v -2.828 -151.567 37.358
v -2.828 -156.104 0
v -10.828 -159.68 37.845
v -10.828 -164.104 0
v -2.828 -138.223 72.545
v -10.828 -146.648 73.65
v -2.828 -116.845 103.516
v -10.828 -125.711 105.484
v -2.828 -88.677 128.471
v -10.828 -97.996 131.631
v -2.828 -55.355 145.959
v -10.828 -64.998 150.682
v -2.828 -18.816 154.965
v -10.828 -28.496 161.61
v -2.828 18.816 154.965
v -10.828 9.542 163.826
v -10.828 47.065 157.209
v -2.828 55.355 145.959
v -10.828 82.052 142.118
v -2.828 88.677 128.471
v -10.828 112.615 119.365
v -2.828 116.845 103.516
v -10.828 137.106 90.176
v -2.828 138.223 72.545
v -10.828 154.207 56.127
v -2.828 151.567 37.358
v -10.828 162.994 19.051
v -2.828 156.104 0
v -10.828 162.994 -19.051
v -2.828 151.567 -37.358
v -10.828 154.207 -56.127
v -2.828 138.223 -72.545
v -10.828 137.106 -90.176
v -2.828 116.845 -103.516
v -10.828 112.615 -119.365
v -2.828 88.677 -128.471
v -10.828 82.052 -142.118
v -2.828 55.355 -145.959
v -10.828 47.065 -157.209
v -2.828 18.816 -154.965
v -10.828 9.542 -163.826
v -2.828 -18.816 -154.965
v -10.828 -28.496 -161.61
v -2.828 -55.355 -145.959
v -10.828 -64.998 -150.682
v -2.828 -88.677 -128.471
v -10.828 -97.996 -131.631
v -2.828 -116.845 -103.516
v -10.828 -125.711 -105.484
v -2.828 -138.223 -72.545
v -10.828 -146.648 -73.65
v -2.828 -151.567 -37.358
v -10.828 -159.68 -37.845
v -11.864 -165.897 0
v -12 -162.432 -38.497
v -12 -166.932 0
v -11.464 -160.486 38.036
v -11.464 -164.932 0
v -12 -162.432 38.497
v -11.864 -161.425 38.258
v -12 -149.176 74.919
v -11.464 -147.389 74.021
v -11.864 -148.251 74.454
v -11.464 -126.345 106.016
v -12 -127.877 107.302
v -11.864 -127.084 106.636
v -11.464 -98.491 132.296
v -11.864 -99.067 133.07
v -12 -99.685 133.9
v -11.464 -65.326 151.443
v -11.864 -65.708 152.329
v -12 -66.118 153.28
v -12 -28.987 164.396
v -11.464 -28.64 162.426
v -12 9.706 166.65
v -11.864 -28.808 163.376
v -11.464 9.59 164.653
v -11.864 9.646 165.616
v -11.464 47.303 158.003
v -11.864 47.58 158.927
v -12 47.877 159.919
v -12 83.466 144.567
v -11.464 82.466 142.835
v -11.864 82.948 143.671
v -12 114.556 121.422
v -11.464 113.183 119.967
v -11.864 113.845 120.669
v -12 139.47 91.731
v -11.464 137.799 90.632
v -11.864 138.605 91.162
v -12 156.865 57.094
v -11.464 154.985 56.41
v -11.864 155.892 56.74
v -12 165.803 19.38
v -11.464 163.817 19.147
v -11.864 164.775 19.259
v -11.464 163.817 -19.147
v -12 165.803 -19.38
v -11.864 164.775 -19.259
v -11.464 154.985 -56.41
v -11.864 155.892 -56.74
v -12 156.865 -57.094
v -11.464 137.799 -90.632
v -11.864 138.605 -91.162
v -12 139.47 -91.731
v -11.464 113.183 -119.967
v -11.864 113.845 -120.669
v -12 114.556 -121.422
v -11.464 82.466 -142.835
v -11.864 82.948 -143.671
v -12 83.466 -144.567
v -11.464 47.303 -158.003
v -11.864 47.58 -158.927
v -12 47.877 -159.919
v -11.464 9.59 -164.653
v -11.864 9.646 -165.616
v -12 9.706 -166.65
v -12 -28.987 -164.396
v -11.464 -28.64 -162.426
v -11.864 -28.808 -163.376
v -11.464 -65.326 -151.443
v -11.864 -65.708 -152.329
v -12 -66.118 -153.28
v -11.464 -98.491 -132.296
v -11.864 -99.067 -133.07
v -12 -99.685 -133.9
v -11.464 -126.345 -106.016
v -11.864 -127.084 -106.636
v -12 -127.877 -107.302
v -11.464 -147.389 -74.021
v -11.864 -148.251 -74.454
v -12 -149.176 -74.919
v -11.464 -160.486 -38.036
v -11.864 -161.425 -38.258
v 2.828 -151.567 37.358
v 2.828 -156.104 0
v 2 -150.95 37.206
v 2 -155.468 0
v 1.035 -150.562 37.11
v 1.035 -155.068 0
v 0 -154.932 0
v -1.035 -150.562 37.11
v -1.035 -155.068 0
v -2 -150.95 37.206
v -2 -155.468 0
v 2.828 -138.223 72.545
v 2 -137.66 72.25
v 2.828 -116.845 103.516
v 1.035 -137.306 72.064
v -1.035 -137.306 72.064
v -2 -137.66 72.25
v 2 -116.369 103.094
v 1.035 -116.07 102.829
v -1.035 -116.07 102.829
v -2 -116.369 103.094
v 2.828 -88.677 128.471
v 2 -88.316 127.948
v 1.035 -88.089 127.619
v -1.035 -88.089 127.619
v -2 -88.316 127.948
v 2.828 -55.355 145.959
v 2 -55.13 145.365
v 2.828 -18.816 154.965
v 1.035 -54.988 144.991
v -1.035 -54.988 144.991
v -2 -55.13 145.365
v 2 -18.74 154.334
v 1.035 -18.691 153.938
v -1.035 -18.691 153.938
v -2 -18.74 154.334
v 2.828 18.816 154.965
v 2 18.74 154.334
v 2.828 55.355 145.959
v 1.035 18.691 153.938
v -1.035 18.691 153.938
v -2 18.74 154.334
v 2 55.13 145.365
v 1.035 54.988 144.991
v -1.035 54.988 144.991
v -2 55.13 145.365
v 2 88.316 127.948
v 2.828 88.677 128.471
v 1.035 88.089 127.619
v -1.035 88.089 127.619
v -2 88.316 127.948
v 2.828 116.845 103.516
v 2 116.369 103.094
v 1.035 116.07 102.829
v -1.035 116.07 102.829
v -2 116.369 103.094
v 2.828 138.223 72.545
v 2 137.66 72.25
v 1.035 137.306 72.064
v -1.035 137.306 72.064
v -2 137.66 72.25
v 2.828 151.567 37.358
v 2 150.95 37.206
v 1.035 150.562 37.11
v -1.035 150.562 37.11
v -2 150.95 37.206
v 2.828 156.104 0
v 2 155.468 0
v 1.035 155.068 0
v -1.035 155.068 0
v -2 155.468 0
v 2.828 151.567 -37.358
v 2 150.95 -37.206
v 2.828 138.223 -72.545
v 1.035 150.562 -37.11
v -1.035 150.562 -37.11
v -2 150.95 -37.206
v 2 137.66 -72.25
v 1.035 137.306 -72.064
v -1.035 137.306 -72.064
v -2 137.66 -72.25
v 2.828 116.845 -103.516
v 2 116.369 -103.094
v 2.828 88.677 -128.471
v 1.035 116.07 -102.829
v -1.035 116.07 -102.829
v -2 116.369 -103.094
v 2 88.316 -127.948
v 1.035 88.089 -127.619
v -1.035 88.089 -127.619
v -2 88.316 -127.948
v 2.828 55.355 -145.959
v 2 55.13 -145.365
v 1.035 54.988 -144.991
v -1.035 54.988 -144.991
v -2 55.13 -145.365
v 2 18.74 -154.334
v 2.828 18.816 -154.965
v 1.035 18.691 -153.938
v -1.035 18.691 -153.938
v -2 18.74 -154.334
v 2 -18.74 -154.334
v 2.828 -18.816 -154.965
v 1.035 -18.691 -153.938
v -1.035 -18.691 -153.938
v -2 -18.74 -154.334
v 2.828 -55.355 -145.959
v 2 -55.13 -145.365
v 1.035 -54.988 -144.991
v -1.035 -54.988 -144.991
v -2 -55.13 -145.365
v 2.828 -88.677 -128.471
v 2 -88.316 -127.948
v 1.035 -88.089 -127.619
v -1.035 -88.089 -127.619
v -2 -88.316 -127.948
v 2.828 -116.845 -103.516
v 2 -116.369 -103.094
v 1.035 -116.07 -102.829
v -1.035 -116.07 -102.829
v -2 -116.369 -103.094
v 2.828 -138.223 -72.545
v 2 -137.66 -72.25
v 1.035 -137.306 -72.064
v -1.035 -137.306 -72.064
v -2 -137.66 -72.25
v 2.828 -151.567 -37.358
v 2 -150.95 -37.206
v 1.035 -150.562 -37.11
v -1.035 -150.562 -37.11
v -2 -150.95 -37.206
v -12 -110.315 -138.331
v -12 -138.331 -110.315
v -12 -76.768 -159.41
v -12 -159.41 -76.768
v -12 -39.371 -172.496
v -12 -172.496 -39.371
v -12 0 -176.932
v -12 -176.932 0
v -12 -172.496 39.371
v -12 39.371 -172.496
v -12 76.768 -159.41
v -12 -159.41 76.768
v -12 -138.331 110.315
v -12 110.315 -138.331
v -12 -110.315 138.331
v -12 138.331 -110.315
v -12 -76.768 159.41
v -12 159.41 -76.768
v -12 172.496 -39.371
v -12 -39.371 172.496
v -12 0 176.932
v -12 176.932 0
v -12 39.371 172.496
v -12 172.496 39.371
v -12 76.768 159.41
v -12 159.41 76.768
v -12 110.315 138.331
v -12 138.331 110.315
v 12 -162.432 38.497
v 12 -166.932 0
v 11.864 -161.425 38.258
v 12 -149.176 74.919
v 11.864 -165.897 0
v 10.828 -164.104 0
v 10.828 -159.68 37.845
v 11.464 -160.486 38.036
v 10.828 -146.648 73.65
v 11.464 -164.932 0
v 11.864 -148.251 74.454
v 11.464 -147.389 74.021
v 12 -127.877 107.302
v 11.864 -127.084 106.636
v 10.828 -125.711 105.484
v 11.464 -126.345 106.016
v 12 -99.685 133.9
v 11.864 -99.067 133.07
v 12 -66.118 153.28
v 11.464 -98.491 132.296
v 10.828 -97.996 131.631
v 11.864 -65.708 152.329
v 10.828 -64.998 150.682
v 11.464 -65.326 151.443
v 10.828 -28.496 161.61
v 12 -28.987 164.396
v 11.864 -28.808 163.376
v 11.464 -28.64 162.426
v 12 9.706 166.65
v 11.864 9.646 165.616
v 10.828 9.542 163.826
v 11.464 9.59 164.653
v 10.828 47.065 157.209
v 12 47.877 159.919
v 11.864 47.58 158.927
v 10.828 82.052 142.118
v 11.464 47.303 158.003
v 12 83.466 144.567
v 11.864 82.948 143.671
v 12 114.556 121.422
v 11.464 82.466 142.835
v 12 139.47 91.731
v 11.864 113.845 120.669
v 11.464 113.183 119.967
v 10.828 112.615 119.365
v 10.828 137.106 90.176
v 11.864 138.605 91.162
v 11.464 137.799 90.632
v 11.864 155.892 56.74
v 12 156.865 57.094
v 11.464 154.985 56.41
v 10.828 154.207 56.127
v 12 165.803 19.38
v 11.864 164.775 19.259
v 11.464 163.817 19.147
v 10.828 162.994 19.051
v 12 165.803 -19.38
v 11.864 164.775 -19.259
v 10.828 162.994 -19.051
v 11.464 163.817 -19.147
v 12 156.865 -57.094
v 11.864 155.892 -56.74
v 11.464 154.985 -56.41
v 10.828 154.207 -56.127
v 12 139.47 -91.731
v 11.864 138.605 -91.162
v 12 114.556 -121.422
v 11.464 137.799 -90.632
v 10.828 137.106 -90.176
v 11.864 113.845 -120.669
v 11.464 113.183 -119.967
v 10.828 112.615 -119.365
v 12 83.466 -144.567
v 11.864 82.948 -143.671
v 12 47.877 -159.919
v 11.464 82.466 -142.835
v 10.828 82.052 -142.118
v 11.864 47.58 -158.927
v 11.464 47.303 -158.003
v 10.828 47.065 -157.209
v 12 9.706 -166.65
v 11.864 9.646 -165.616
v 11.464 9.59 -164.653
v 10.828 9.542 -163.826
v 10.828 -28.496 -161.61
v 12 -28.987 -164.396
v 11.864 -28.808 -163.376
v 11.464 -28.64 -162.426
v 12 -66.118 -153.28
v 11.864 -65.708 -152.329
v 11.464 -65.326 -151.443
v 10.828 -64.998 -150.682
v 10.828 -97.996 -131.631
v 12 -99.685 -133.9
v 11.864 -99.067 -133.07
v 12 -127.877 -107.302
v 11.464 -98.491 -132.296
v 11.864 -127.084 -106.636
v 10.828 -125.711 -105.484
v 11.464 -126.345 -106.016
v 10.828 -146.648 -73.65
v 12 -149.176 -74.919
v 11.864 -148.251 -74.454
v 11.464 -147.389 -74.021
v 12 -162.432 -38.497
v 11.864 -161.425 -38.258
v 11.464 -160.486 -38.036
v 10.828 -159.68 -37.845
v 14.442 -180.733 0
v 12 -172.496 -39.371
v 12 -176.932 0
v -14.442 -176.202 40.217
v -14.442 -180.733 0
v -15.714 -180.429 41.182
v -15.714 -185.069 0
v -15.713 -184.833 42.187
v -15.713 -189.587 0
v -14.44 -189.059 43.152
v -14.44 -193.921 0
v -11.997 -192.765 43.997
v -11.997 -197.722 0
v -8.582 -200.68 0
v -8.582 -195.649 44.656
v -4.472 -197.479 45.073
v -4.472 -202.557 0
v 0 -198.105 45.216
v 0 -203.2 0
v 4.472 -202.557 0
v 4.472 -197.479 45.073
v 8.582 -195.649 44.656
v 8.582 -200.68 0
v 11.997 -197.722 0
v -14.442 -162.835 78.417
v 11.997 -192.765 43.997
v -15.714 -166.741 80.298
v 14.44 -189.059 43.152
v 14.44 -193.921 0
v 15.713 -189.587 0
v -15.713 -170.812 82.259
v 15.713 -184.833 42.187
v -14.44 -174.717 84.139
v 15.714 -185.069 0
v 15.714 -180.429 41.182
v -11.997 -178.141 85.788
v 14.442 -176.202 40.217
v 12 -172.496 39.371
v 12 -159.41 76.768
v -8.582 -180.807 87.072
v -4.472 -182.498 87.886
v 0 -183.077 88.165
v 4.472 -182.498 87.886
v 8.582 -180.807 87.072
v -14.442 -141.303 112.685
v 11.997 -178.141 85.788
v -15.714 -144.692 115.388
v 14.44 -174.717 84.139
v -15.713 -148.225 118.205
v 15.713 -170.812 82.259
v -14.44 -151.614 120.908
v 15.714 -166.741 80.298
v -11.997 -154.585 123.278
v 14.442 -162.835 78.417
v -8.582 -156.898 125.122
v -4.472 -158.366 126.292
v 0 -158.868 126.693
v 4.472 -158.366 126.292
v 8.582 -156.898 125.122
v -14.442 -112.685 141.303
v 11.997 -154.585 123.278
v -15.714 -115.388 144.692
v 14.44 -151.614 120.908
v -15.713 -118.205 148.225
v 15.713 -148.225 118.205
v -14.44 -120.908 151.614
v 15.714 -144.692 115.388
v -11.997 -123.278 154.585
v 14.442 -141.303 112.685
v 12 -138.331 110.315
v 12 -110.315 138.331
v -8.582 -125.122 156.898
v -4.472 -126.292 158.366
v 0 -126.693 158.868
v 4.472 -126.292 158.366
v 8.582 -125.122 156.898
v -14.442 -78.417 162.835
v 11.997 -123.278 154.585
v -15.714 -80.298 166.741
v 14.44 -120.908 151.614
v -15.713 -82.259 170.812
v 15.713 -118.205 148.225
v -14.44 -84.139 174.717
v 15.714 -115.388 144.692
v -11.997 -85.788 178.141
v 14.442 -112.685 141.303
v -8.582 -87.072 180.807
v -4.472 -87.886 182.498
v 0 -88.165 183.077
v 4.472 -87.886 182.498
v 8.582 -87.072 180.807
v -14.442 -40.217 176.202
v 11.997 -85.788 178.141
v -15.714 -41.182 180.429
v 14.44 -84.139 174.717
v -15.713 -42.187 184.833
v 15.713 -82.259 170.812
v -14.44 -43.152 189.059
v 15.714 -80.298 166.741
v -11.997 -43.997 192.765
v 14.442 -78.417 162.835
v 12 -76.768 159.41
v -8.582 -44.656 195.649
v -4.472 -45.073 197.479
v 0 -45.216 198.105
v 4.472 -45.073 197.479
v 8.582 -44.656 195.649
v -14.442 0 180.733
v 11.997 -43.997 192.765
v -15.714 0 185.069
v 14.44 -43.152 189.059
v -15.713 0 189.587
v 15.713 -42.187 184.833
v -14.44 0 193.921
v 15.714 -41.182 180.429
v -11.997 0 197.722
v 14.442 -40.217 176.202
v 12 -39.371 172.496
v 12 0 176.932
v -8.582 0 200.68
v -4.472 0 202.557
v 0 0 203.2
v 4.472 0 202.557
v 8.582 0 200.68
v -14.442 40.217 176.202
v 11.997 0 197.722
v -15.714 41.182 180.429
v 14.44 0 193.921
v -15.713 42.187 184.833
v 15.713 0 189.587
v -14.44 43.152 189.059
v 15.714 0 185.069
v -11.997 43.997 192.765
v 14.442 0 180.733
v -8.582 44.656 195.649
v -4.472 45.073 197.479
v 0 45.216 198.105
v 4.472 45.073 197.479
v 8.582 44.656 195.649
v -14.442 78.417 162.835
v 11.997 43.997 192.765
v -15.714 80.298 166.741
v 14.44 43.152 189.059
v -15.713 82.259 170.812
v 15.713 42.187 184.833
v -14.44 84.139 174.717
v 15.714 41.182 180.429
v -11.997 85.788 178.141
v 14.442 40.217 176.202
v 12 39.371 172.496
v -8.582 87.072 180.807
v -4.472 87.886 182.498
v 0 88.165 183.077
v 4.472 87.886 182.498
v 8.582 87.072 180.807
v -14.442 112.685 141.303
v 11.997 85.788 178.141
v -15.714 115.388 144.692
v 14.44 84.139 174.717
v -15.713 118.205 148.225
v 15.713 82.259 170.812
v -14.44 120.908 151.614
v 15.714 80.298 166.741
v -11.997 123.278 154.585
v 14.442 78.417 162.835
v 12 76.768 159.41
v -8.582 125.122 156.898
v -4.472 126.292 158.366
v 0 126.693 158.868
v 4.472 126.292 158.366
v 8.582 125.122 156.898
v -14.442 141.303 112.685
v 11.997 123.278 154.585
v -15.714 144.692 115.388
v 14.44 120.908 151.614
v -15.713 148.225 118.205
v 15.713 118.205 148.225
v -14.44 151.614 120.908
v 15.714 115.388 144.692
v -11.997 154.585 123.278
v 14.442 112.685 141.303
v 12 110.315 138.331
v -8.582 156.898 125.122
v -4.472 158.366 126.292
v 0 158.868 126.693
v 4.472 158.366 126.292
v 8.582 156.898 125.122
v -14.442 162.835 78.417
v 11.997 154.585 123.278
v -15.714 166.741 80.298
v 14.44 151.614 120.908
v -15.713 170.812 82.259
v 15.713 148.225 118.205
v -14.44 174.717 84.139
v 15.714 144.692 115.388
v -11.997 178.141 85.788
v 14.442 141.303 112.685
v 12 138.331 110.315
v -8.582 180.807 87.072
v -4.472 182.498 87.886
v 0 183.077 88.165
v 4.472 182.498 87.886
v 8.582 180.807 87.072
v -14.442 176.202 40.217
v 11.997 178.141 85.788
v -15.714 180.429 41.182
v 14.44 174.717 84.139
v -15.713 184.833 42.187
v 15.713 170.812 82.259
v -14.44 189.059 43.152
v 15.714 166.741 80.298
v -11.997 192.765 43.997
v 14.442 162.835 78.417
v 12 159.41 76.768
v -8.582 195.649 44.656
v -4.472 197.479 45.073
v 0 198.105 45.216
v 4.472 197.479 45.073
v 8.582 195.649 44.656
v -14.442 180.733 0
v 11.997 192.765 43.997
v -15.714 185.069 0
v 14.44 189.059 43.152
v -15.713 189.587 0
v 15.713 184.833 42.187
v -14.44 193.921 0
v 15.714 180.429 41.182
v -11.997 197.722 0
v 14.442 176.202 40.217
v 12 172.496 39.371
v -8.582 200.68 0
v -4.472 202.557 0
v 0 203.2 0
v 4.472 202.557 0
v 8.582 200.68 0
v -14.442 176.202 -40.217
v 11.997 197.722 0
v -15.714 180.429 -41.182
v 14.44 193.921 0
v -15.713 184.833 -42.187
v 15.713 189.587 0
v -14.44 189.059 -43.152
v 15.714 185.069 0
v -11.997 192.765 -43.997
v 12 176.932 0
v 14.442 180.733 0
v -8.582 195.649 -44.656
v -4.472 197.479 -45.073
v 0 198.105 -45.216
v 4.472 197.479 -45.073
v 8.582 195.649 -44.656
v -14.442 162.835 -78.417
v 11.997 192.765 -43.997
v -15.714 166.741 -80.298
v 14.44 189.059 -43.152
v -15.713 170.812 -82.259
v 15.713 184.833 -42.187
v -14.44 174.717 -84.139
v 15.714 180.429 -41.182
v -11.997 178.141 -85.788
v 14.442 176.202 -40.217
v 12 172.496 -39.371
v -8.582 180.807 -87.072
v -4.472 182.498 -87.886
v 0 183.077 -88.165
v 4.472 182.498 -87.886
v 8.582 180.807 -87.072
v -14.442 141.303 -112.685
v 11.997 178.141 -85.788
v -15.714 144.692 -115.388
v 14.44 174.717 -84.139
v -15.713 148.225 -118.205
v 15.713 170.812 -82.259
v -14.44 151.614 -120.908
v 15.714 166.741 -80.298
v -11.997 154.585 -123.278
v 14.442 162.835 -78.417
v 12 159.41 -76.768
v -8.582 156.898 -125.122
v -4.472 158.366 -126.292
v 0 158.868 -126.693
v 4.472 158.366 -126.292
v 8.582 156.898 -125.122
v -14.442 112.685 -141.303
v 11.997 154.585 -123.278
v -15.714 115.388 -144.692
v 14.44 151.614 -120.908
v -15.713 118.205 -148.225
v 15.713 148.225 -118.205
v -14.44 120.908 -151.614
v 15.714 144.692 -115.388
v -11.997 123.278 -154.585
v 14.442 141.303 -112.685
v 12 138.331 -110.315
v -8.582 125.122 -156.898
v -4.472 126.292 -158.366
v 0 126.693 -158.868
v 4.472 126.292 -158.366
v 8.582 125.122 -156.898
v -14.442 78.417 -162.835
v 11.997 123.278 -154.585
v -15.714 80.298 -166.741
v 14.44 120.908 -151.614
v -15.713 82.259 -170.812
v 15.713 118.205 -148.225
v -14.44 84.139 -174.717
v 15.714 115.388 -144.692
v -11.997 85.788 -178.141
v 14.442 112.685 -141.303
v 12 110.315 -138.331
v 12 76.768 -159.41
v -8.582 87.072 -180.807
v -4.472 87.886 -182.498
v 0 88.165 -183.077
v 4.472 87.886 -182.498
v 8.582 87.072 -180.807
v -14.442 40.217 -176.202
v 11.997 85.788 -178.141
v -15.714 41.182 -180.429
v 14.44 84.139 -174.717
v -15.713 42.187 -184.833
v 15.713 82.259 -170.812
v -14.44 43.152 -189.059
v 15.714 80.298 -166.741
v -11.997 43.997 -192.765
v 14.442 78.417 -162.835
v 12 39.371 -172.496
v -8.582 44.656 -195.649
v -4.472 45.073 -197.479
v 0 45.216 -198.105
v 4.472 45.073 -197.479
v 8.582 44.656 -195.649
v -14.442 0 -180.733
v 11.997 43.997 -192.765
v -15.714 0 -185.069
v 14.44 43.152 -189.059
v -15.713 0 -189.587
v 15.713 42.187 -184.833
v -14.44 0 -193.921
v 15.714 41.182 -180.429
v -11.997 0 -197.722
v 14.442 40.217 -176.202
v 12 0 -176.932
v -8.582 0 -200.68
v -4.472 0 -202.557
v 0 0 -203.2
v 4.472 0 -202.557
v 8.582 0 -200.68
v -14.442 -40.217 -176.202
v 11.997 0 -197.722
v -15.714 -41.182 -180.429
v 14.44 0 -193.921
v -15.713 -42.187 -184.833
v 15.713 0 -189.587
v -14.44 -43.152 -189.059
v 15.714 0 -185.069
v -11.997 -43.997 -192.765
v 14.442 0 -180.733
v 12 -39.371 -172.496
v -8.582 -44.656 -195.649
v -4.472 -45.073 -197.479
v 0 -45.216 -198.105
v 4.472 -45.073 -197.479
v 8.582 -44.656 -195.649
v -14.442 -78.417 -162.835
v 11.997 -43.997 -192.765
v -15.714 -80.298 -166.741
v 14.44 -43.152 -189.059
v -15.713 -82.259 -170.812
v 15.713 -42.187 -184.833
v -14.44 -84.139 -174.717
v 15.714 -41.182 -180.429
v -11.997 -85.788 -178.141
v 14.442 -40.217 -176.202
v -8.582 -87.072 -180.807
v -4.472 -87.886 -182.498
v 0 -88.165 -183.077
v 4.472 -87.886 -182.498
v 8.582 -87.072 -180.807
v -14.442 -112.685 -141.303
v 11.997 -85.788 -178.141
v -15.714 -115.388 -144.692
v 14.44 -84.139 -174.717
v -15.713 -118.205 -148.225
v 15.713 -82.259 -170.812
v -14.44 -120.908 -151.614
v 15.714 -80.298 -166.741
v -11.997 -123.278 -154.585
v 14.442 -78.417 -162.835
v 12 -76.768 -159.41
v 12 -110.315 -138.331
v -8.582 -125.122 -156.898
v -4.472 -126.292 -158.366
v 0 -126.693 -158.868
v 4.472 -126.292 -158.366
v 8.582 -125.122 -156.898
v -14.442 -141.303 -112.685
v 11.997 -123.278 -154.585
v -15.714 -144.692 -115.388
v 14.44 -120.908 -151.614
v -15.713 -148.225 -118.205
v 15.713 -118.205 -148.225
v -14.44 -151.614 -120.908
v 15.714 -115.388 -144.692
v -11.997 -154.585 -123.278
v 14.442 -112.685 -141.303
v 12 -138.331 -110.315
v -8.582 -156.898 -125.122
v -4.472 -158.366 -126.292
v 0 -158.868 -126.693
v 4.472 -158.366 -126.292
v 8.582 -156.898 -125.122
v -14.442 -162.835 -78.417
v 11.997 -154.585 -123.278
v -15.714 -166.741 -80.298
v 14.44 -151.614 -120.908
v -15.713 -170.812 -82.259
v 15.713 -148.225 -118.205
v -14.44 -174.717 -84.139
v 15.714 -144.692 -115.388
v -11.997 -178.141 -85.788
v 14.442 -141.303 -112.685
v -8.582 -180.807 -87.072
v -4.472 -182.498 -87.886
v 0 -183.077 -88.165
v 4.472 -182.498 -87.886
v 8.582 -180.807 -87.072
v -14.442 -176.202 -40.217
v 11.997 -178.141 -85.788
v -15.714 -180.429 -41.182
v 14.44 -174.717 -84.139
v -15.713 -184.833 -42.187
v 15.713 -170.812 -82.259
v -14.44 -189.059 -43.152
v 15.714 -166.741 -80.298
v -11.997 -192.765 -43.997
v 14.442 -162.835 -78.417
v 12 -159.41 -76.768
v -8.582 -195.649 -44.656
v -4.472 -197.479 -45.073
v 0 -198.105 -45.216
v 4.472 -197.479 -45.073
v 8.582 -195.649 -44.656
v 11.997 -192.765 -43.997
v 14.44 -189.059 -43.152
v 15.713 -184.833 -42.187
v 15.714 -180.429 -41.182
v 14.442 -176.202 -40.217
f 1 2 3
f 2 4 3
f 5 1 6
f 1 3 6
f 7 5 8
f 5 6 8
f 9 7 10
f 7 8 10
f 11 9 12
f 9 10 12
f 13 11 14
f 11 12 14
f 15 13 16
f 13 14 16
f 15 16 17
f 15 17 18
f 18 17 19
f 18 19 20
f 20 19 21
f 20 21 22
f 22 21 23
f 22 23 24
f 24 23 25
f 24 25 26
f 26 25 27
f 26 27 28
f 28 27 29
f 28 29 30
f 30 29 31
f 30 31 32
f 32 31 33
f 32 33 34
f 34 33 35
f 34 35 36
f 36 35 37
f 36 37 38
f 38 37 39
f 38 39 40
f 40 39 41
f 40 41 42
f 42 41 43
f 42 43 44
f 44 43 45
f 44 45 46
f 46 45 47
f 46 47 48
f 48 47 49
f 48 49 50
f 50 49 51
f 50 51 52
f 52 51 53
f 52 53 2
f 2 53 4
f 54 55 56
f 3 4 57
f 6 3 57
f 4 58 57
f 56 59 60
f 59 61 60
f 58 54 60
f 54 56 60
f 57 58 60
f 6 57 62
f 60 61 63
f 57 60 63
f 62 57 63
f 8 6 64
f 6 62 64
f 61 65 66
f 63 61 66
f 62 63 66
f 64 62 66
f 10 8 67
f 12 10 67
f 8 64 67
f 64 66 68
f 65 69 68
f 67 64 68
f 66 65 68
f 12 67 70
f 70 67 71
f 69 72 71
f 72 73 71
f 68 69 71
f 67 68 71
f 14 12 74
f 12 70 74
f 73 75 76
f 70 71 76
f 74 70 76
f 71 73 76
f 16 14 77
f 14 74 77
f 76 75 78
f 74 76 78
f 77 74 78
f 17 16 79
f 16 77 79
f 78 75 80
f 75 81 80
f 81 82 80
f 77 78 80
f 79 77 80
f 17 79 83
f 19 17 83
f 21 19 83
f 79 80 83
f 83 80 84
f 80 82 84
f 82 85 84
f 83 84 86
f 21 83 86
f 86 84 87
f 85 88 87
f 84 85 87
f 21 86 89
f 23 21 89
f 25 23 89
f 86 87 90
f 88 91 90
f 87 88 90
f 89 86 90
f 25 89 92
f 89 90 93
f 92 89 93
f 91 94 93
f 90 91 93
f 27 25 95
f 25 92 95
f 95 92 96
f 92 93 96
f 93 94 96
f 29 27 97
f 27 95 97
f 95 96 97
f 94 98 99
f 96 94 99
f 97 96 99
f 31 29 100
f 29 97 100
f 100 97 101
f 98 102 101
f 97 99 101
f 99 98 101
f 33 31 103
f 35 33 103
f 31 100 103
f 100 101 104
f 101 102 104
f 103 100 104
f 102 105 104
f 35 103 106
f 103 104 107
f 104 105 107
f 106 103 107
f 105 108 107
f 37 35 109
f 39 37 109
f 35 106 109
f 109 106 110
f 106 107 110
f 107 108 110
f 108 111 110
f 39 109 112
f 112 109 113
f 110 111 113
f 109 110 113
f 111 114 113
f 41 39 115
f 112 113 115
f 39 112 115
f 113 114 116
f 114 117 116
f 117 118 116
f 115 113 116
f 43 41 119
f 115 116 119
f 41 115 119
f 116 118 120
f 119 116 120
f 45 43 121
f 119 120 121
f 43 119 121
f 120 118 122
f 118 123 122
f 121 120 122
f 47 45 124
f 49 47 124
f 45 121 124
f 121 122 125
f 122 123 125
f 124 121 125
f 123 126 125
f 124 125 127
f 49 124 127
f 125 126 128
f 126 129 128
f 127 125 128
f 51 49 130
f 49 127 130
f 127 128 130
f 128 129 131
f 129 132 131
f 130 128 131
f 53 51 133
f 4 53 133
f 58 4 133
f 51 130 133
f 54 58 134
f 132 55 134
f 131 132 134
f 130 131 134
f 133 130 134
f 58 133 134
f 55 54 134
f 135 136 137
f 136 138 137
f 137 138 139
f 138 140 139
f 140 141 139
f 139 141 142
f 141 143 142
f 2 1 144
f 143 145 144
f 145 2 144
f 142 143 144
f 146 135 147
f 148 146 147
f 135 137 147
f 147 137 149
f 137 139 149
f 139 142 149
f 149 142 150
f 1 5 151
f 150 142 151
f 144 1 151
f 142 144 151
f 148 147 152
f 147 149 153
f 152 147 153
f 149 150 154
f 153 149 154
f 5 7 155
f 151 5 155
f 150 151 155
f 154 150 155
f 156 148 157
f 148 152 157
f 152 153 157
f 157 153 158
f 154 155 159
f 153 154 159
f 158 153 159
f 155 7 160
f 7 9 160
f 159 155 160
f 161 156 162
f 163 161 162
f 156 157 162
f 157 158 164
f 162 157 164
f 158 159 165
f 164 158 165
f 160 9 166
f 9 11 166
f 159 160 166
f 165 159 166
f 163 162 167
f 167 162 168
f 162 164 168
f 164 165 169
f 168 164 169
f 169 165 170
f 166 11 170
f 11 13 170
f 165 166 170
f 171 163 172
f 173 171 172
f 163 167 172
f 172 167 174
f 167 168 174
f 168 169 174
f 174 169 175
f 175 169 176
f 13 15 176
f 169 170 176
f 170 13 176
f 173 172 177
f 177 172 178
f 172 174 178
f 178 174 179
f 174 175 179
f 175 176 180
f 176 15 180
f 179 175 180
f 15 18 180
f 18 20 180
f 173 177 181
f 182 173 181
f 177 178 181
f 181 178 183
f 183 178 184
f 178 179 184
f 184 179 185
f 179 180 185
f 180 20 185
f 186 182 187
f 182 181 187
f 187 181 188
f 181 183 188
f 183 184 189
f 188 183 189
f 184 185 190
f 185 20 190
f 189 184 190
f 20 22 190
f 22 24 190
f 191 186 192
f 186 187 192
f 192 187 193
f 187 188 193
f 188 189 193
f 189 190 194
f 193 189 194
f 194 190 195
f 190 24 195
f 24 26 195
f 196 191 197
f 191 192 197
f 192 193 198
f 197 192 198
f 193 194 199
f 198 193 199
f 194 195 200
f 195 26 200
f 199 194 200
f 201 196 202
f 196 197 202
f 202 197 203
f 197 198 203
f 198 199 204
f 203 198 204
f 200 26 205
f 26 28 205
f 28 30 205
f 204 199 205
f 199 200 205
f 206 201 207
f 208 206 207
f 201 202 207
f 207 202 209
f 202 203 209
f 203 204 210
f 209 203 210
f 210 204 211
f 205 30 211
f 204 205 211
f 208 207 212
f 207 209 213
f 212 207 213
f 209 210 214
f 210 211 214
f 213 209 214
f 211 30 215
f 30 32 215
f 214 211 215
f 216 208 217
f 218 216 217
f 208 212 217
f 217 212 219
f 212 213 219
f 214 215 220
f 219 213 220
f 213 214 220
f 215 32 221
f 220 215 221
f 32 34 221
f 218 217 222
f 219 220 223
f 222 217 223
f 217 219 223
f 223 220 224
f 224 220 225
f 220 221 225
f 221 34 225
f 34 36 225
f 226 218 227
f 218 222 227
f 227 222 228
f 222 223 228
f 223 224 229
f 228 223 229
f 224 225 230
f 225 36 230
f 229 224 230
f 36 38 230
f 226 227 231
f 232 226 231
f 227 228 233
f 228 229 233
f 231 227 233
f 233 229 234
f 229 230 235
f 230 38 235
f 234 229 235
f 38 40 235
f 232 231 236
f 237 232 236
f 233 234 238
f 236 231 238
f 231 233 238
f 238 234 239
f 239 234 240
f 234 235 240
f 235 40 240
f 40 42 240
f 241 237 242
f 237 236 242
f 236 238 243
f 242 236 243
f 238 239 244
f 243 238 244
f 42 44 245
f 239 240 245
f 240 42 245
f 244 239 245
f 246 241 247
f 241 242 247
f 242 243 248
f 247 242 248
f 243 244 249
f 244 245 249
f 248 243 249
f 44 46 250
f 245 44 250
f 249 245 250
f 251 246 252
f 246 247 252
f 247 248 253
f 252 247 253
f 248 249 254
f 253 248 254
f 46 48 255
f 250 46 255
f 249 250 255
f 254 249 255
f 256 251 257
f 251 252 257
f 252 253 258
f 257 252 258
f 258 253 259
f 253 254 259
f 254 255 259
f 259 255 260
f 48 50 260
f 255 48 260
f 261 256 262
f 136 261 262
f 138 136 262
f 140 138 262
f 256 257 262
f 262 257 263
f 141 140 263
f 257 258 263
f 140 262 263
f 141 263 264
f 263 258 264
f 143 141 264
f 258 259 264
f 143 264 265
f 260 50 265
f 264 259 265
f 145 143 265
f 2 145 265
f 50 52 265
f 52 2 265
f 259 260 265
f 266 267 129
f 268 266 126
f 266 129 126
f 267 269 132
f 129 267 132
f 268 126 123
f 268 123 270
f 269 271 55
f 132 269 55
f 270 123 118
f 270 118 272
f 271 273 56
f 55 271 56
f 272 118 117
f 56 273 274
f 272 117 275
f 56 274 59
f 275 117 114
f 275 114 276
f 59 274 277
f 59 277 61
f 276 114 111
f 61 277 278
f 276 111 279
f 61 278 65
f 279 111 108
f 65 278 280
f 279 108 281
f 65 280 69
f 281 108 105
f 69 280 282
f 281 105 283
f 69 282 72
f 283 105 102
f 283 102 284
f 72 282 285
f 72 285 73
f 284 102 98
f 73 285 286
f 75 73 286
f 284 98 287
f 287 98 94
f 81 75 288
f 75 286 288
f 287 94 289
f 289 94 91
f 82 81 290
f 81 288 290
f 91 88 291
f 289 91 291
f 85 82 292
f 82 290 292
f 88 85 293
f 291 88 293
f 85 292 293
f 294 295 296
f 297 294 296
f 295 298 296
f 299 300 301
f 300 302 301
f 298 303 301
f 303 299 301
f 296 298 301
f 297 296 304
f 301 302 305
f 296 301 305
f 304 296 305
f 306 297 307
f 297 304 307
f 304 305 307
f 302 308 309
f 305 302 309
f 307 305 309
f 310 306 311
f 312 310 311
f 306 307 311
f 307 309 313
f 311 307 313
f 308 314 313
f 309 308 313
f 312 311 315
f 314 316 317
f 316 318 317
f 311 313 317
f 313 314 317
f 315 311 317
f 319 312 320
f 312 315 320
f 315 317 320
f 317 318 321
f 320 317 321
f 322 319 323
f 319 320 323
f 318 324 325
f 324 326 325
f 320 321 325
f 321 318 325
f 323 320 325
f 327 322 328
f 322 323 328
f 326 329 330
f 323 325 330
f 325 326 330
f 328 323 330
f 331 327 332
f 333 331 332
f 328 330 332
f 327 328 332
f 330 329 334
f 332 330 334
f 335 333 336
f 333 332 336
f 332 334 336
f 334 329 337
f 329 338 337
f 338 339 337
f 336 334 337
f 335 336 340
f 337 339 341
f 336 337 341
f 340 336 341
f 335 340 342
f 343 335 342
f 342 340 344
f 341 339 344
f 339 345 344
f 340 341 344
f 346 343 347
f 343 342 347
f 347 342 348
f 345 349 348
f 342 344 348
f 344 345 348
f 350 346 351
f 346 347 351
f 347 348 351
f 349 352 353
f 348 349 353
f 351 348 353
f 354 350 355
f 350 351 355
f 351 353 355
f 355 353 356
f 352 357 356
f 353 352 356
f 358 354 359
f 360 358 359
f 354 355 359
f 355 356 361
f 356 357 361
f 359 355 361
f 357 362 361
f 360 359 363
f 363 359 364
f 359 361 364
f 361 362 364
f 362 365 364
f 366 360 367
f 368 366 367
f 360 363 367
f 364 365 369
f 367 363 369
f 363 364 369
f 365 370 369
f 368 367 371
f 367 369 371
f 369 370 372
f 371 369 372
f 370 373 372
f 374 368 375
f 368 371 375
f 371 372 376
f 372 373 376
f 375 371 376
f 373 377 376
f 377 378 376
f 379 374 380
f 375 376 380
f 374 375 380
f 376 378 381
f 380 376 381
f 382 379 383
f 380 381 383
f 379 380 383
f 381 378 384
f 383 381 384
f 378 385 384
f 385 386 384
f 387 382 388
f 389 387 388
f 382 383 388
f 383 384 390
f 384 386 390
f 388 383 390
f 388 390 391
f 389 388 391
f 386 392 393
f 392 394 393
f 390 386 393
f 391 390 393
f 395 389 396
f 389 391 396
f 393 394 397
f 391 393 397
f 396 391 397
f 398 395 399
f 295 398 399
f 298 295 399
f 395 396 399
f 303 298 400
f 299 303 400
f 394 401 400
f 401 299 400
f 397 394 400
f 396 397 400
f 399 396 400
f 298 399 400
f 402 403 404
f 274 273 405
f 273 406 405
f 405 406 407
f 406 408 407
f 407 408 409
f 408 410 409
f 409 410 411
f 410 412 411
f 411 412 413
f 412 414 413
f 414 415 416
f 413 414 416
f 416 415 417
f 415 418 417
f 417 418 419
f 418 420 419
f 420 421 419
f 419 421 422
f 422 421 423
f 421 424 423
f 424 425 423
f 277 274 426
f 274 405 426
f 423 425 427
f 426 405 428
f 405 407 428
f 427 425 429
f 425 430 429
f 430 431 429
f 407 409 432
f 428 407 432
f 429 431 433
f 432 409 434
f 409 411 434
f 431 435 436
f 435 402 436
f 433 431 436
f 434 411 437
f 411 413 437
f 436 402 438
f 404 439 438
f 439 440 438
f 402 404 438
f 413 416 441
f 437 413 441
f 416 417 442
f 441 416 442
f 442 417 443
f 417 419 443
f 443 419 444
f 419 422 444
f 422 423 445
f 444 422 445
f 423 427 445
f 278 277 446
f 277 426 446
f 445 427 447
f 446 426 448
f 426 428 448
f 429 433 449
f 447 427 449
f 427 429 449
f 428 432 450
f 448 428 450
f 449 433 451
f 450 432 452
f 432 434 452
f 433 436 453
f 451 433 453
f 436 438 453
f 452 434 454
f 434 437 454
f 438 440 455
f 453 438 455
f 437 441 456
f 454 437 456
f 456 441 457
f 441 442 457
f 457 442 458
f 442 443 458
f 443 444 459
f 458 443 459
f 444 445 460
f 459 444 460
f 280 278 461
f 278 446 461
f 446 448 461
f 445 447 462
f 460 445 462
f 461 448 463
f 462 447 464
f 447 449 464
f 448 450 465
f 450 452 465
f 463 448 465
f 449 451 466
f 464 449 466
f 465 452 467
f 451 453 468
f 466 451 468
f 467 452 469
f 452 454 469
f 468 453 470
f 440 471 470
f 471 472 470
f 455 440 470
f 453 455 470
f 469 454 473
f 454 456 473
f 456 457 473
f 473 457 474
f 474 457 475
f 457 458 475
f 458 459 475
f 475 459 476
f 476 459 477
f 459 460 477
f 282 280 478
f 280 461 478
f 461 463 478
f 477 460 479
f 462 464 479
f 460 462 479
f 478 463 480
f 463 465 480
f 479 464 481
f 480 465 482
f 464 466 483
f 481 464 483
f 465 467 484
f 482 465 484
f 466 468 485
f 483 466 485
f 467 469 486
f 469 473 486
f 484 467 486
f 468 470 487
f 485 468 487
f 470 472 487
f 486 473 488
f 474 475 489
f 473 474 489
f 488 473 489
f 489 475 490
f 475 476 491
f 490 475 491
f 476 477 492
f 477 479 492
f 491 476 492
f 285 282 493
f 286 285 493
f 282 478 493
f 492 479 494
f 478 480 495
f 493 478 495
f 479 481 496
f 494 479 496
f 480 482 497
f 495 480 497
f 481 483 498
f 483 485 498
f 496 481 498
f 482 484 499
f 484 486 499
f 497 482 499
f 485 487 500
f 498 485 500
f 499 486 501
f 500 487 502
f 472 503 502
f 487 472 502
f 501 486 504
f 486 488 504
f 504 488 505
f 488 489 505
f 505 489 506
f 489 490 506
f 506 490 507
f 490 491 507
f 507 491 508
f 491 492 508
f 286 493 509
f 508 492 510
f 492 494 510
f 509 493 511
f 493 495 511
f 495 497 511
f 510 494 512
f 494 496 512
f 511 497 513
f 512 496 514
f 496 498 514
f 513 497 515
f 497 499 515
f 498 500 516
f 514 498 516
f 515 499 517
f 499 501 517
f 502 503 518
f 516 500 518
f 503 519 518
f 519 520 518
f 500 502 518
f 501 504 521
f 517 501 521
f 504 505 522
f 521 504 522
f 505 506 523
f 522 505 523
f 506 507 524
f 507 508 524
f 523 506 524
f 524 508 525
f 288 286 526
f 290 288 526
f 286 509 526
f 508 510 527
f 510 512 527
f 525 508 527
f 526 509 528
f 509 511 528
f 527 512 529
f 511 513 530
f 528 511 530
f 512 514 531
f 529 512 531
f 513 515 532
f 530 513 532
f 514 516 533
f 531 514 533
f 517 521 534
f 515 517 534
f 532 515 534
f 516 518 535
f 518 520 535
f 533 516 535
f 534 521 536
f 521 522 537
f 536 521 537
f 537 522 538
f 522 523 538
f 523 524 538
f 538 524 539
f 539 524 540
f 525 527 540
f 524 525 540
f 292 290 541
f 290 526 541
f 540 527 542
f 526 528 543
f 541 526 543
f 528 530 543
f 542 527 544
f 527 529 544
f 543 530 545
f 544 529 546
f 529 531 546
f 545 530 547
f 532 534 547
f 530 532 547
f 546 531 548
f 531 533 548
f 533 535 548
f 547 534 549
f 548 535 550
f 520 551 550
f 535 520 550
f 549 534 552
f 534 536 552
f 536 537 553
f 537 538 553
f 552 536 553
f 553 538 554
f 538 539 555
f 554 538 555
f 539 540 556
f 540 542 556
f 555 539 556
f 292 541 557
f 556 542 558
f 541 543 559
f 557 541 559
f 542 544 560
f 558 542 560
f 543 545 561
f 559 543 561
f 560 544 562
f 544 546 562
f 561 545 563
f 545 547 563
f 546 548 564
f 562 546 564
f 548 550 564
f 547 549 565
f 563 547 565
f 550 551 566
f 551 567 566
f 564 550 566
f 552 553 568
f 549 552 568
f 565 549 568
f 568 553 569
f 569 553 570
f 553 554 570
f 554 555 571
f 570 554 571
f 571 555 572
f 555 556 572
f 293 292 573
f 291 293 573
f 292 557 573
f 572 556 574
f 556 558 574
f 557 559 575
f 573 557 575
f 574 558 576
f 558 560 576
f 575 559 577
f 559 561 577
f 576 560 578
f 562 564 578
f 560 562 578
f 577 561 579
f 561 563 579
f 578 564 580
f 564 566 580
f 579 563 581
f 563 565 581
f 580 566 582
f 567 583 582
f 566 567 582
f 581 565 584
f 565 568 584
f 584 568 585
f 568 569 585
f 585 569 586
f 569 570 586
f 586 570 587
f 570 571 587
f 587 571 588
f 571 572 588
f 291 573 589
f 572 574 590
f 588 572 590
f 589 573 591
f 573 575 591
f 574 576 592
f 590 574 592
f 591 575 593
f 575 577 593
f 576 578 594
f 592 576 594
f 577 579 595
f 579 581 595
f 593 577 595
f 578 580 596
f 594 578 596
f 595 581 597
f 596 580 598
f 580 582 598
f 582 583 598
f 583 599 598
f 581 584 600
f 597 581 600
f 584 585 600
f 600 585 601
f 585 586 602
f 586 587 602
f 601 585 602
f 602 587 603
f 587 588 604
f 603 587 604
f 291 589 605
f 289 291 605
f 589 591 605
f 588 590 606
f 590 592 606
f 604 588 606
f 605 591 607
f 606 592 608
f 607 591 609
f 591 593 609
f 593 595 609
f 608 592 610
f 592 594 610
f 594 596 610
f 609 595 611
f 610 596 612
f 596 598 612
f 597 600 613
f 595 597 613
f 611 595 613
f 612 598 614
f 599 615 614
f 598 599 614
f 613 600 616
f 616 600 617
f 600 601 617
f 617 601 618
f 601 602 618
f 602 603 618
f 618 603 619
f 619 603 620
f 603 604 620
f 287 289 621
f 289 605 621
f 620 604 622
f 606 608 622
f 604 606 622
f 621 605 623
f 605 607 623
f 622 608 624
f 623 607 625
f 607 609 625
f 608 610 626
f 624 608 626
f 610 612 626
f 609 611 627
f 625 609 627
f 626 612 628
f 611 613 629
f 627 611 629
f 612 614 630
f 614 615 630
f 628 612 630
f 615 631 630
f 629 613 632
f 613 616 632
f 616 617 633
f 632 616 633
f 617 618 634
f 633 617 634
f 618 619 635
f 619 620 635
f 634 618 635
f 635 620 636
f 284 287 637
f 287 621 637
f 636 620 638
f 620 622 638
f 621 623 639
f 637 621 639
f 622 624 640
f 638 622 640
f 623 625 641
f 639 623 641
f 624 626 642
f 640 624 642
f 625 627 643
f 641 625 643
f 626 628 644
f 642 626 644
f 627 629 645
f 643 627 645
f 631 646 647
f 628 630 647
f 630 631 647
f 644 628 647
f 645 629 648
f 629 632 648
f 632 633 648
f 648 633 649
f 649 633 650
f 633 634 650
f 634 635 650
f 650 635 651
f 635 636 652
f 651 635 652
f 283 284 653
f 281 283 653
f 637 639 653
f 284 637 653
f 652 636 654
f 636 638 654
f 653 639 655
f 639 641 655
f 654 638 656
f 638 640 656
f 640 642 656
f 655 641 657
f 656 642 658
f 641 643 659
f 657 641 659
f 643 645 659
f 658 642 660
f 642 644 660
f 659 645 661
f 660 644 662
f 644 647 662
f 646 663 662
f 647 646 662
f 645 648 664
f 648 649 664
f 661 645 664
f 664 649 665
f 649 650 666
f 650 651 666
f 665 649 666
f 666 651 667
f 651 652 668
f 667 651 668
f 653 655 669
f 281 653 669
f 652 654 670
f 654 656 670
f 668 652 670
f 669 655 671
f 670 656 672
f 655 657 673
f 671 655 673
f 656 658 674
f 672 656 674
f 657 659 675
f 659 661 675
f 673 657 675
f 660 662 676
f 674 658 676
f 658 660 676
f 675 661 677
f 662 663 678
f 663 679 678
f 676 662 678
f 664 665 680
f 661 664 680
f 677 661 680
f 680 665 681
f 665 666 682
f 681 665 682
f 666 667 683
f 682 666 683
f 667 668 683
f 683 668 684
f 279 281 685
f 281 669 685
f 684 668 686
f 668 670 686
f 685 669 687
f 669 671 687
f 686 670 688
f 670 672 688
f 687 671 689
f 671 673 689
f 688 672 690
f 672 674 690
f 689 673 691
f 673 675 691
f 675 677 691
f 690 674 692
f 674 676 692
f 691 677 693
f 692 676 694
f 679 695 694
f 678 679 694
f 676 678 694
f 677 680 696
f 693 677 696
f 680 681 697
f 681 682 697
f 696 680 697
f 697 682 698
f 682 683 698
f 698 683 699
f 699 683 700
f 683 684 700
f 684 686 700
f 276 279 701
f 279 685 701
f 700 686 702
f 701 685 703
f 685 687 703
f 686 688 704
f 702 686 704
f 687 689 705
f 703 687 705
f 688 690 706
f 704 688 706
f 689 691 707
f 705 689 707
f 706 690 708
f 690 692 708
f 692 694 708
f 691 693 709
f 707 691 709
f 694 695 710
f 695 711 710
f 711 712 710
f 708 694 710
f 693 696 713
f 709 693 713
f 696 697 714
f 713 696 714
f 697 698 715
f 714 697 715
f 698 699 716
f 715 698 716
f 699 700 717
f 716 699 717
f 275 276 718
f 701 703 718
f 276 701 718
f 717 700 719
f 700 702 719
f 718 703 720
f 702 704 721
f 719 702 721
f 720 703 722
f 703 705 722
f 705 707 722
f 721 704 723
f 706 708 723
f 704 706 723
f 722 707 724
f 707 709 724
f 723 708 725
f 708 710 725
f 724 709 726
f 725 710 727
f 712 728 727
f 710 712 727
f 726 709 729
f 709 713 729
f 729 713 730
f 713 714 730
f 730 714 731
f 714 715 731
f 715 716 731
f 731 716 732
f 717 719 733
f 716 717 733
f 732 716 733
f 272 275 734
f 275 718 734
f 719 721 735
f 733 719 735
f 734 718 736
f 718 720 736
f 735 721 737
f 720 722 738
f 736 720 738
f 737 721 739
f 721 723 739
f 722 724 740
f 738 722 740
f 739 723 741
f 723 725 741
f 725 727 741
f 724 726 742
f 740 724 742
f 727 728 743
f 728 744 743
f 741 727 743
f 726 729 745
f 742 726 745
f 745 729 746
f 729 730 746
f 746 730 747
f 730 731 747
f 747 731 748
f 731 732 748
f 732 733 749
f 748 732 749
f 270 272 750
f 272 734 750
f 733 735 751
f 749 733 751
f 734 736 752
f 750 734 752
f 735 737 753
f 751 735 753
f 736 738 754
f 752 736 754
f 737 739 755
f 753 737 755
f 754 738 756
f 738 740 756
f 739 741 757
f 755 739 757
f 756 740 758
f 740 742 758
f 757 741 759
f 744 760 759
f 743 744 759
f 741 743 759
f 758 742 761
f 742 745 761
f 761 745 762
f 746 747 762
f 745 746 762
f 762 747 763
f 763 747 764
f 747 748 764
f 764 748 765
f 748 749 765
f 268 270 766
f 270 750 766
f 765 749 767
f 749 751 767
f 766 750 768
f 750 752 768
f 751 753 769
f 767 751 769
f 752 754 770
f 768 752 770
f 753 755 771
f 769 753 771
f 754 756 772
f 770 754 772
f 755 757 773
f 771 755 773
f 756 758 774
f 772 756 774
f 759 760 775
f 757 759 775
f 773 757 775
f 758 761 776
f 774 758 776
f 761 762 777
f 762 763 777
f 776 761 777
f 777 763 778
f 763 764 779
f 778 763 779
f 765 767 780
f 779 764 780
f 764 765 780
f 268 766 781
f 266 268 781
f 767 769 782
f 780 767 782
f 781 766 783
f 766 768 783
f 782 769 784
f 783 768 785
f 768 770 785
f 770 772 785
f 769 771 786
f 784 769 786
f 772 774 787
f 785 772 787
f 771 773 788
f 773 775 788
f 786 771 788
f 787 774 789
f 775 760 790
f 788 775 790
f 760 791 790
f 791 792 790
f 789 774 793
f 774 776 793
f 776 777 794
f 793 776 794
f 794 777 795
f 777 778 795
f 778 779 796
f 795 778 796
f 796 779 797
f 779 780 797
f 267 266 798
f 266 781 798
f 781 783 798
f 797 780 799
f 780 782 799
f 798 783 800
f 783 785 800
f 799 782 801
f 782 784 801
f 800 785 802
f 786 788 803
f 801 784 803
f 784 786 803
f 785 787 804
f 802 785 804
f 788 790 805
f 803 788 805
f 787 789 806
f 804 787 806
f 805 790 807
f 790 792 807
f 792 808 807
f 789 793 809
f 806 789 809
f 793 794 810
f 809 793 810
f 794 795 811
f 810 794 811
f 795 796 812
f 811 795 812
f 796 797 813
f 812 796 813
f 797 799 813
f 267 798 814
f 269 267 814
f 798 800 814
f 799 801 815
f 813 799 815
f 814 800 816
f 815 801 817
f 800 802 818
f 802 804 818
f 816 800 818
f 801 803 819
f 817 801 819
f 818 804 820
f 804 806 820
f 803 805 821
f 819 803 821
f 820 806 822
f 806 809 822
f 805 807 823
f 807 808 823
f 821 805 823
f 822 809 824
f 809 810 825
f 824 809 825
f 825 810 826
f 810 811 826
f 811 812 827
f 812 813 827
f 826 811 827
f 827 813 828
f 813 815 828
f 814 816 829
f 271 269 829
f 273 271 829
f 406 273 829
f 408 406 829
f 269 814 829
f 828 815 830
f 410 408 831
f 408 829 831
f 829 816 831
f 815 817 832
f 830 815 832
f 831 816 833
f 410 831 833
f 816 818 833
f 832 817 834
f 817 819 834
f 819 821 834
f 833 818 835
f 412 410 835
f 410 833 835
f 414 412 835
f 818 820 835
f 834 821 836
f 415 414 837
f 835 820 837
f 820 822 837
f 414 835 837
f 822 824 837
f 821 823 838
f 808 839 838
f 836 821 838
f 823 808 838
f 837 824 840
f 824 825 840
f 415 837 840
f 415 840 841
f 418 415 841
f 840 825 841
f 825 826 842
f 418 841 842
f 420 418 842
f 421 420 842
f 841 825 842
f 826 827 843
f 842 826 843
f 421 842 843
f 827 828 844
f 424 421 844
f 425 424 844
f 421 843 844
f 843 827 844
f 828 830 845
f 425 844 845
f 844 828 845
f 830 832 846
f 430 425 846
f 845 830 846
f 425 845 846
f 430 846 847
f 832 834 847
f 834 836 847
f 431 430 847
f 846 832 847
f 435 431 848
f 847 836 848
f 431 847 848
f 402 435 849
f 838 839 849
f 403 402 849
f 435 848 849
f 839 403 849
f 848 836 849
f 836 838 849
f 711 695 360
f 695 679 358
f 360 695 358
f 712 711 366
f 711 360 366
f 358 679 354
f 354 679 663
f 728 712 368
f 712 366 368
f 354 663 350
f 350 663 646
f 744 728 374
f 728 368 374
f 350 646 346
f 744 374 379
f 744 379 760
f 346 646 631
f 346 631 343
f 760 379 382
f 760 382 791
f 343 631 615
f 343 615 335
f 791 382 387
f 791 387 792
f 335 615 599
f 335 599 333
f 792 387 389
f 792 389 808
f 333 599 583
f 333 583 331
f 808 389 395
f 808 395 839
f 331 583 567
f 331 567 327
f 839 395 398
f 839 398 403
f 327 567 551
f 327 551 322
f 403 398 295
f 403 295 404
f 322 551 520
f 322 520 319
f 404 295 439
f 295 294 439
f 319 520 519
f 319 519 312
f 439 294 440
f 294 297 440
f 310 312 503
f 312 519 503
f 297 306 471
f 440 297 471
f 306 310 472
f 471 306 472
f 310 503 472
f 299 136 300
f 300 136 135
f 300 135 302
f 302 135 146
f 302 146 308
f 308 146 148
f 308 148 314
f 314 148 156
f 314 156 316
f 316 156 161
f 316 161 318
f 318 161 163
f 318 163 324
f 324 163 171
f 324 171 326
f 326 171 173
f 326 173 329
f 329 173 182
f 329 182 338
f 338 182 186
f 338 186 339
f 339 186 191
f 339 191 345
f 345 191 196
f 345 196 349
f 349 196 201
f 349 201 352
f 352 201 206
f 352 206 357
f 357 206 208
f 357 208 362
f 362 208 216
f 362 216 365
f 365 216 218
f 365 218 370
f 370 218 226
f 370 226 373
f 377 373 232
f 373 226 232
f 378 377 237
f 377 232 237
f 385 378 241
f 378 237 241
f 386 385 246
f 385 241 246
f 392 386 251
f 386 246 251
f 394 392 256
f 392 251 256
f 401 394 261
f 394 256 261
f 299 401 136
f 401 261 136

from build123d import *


with BuildPart() as f1:
    # F0 (on Top) → F1 (revolve)
    with BuildSketch(Plane.XY):
        with BuildLine():
            ThreePointArc((2.828427, -156.103516), (0, -154.931943), (-2.828427, -156.103516))
            Line((-2.828427, -156.103516), (-10.828427, -164.103516))
            ThreePointArc((-10.828427, -164.103516), (-11.695518, -165.40121), (-12, -166.931943))
            Line((-12, -166.931943), (-12, -176.931943))
            ThreePointArc((-12, -176.931943), (0, -203.2), (12, -176.931943))
            Line((12, -176.931943), (12, -166.931943))
            ThreePointArc((12, -166.931943), (11.695518, -165.40121), (10.828427, -164.103516))
            Line((10.828427, -164.103516), (2.828427, -156.103516))
        make_face()
    revolve(axis=Axis((-7.103204, 0, 0), (-1, 0, 0)))


solid = f1.part
